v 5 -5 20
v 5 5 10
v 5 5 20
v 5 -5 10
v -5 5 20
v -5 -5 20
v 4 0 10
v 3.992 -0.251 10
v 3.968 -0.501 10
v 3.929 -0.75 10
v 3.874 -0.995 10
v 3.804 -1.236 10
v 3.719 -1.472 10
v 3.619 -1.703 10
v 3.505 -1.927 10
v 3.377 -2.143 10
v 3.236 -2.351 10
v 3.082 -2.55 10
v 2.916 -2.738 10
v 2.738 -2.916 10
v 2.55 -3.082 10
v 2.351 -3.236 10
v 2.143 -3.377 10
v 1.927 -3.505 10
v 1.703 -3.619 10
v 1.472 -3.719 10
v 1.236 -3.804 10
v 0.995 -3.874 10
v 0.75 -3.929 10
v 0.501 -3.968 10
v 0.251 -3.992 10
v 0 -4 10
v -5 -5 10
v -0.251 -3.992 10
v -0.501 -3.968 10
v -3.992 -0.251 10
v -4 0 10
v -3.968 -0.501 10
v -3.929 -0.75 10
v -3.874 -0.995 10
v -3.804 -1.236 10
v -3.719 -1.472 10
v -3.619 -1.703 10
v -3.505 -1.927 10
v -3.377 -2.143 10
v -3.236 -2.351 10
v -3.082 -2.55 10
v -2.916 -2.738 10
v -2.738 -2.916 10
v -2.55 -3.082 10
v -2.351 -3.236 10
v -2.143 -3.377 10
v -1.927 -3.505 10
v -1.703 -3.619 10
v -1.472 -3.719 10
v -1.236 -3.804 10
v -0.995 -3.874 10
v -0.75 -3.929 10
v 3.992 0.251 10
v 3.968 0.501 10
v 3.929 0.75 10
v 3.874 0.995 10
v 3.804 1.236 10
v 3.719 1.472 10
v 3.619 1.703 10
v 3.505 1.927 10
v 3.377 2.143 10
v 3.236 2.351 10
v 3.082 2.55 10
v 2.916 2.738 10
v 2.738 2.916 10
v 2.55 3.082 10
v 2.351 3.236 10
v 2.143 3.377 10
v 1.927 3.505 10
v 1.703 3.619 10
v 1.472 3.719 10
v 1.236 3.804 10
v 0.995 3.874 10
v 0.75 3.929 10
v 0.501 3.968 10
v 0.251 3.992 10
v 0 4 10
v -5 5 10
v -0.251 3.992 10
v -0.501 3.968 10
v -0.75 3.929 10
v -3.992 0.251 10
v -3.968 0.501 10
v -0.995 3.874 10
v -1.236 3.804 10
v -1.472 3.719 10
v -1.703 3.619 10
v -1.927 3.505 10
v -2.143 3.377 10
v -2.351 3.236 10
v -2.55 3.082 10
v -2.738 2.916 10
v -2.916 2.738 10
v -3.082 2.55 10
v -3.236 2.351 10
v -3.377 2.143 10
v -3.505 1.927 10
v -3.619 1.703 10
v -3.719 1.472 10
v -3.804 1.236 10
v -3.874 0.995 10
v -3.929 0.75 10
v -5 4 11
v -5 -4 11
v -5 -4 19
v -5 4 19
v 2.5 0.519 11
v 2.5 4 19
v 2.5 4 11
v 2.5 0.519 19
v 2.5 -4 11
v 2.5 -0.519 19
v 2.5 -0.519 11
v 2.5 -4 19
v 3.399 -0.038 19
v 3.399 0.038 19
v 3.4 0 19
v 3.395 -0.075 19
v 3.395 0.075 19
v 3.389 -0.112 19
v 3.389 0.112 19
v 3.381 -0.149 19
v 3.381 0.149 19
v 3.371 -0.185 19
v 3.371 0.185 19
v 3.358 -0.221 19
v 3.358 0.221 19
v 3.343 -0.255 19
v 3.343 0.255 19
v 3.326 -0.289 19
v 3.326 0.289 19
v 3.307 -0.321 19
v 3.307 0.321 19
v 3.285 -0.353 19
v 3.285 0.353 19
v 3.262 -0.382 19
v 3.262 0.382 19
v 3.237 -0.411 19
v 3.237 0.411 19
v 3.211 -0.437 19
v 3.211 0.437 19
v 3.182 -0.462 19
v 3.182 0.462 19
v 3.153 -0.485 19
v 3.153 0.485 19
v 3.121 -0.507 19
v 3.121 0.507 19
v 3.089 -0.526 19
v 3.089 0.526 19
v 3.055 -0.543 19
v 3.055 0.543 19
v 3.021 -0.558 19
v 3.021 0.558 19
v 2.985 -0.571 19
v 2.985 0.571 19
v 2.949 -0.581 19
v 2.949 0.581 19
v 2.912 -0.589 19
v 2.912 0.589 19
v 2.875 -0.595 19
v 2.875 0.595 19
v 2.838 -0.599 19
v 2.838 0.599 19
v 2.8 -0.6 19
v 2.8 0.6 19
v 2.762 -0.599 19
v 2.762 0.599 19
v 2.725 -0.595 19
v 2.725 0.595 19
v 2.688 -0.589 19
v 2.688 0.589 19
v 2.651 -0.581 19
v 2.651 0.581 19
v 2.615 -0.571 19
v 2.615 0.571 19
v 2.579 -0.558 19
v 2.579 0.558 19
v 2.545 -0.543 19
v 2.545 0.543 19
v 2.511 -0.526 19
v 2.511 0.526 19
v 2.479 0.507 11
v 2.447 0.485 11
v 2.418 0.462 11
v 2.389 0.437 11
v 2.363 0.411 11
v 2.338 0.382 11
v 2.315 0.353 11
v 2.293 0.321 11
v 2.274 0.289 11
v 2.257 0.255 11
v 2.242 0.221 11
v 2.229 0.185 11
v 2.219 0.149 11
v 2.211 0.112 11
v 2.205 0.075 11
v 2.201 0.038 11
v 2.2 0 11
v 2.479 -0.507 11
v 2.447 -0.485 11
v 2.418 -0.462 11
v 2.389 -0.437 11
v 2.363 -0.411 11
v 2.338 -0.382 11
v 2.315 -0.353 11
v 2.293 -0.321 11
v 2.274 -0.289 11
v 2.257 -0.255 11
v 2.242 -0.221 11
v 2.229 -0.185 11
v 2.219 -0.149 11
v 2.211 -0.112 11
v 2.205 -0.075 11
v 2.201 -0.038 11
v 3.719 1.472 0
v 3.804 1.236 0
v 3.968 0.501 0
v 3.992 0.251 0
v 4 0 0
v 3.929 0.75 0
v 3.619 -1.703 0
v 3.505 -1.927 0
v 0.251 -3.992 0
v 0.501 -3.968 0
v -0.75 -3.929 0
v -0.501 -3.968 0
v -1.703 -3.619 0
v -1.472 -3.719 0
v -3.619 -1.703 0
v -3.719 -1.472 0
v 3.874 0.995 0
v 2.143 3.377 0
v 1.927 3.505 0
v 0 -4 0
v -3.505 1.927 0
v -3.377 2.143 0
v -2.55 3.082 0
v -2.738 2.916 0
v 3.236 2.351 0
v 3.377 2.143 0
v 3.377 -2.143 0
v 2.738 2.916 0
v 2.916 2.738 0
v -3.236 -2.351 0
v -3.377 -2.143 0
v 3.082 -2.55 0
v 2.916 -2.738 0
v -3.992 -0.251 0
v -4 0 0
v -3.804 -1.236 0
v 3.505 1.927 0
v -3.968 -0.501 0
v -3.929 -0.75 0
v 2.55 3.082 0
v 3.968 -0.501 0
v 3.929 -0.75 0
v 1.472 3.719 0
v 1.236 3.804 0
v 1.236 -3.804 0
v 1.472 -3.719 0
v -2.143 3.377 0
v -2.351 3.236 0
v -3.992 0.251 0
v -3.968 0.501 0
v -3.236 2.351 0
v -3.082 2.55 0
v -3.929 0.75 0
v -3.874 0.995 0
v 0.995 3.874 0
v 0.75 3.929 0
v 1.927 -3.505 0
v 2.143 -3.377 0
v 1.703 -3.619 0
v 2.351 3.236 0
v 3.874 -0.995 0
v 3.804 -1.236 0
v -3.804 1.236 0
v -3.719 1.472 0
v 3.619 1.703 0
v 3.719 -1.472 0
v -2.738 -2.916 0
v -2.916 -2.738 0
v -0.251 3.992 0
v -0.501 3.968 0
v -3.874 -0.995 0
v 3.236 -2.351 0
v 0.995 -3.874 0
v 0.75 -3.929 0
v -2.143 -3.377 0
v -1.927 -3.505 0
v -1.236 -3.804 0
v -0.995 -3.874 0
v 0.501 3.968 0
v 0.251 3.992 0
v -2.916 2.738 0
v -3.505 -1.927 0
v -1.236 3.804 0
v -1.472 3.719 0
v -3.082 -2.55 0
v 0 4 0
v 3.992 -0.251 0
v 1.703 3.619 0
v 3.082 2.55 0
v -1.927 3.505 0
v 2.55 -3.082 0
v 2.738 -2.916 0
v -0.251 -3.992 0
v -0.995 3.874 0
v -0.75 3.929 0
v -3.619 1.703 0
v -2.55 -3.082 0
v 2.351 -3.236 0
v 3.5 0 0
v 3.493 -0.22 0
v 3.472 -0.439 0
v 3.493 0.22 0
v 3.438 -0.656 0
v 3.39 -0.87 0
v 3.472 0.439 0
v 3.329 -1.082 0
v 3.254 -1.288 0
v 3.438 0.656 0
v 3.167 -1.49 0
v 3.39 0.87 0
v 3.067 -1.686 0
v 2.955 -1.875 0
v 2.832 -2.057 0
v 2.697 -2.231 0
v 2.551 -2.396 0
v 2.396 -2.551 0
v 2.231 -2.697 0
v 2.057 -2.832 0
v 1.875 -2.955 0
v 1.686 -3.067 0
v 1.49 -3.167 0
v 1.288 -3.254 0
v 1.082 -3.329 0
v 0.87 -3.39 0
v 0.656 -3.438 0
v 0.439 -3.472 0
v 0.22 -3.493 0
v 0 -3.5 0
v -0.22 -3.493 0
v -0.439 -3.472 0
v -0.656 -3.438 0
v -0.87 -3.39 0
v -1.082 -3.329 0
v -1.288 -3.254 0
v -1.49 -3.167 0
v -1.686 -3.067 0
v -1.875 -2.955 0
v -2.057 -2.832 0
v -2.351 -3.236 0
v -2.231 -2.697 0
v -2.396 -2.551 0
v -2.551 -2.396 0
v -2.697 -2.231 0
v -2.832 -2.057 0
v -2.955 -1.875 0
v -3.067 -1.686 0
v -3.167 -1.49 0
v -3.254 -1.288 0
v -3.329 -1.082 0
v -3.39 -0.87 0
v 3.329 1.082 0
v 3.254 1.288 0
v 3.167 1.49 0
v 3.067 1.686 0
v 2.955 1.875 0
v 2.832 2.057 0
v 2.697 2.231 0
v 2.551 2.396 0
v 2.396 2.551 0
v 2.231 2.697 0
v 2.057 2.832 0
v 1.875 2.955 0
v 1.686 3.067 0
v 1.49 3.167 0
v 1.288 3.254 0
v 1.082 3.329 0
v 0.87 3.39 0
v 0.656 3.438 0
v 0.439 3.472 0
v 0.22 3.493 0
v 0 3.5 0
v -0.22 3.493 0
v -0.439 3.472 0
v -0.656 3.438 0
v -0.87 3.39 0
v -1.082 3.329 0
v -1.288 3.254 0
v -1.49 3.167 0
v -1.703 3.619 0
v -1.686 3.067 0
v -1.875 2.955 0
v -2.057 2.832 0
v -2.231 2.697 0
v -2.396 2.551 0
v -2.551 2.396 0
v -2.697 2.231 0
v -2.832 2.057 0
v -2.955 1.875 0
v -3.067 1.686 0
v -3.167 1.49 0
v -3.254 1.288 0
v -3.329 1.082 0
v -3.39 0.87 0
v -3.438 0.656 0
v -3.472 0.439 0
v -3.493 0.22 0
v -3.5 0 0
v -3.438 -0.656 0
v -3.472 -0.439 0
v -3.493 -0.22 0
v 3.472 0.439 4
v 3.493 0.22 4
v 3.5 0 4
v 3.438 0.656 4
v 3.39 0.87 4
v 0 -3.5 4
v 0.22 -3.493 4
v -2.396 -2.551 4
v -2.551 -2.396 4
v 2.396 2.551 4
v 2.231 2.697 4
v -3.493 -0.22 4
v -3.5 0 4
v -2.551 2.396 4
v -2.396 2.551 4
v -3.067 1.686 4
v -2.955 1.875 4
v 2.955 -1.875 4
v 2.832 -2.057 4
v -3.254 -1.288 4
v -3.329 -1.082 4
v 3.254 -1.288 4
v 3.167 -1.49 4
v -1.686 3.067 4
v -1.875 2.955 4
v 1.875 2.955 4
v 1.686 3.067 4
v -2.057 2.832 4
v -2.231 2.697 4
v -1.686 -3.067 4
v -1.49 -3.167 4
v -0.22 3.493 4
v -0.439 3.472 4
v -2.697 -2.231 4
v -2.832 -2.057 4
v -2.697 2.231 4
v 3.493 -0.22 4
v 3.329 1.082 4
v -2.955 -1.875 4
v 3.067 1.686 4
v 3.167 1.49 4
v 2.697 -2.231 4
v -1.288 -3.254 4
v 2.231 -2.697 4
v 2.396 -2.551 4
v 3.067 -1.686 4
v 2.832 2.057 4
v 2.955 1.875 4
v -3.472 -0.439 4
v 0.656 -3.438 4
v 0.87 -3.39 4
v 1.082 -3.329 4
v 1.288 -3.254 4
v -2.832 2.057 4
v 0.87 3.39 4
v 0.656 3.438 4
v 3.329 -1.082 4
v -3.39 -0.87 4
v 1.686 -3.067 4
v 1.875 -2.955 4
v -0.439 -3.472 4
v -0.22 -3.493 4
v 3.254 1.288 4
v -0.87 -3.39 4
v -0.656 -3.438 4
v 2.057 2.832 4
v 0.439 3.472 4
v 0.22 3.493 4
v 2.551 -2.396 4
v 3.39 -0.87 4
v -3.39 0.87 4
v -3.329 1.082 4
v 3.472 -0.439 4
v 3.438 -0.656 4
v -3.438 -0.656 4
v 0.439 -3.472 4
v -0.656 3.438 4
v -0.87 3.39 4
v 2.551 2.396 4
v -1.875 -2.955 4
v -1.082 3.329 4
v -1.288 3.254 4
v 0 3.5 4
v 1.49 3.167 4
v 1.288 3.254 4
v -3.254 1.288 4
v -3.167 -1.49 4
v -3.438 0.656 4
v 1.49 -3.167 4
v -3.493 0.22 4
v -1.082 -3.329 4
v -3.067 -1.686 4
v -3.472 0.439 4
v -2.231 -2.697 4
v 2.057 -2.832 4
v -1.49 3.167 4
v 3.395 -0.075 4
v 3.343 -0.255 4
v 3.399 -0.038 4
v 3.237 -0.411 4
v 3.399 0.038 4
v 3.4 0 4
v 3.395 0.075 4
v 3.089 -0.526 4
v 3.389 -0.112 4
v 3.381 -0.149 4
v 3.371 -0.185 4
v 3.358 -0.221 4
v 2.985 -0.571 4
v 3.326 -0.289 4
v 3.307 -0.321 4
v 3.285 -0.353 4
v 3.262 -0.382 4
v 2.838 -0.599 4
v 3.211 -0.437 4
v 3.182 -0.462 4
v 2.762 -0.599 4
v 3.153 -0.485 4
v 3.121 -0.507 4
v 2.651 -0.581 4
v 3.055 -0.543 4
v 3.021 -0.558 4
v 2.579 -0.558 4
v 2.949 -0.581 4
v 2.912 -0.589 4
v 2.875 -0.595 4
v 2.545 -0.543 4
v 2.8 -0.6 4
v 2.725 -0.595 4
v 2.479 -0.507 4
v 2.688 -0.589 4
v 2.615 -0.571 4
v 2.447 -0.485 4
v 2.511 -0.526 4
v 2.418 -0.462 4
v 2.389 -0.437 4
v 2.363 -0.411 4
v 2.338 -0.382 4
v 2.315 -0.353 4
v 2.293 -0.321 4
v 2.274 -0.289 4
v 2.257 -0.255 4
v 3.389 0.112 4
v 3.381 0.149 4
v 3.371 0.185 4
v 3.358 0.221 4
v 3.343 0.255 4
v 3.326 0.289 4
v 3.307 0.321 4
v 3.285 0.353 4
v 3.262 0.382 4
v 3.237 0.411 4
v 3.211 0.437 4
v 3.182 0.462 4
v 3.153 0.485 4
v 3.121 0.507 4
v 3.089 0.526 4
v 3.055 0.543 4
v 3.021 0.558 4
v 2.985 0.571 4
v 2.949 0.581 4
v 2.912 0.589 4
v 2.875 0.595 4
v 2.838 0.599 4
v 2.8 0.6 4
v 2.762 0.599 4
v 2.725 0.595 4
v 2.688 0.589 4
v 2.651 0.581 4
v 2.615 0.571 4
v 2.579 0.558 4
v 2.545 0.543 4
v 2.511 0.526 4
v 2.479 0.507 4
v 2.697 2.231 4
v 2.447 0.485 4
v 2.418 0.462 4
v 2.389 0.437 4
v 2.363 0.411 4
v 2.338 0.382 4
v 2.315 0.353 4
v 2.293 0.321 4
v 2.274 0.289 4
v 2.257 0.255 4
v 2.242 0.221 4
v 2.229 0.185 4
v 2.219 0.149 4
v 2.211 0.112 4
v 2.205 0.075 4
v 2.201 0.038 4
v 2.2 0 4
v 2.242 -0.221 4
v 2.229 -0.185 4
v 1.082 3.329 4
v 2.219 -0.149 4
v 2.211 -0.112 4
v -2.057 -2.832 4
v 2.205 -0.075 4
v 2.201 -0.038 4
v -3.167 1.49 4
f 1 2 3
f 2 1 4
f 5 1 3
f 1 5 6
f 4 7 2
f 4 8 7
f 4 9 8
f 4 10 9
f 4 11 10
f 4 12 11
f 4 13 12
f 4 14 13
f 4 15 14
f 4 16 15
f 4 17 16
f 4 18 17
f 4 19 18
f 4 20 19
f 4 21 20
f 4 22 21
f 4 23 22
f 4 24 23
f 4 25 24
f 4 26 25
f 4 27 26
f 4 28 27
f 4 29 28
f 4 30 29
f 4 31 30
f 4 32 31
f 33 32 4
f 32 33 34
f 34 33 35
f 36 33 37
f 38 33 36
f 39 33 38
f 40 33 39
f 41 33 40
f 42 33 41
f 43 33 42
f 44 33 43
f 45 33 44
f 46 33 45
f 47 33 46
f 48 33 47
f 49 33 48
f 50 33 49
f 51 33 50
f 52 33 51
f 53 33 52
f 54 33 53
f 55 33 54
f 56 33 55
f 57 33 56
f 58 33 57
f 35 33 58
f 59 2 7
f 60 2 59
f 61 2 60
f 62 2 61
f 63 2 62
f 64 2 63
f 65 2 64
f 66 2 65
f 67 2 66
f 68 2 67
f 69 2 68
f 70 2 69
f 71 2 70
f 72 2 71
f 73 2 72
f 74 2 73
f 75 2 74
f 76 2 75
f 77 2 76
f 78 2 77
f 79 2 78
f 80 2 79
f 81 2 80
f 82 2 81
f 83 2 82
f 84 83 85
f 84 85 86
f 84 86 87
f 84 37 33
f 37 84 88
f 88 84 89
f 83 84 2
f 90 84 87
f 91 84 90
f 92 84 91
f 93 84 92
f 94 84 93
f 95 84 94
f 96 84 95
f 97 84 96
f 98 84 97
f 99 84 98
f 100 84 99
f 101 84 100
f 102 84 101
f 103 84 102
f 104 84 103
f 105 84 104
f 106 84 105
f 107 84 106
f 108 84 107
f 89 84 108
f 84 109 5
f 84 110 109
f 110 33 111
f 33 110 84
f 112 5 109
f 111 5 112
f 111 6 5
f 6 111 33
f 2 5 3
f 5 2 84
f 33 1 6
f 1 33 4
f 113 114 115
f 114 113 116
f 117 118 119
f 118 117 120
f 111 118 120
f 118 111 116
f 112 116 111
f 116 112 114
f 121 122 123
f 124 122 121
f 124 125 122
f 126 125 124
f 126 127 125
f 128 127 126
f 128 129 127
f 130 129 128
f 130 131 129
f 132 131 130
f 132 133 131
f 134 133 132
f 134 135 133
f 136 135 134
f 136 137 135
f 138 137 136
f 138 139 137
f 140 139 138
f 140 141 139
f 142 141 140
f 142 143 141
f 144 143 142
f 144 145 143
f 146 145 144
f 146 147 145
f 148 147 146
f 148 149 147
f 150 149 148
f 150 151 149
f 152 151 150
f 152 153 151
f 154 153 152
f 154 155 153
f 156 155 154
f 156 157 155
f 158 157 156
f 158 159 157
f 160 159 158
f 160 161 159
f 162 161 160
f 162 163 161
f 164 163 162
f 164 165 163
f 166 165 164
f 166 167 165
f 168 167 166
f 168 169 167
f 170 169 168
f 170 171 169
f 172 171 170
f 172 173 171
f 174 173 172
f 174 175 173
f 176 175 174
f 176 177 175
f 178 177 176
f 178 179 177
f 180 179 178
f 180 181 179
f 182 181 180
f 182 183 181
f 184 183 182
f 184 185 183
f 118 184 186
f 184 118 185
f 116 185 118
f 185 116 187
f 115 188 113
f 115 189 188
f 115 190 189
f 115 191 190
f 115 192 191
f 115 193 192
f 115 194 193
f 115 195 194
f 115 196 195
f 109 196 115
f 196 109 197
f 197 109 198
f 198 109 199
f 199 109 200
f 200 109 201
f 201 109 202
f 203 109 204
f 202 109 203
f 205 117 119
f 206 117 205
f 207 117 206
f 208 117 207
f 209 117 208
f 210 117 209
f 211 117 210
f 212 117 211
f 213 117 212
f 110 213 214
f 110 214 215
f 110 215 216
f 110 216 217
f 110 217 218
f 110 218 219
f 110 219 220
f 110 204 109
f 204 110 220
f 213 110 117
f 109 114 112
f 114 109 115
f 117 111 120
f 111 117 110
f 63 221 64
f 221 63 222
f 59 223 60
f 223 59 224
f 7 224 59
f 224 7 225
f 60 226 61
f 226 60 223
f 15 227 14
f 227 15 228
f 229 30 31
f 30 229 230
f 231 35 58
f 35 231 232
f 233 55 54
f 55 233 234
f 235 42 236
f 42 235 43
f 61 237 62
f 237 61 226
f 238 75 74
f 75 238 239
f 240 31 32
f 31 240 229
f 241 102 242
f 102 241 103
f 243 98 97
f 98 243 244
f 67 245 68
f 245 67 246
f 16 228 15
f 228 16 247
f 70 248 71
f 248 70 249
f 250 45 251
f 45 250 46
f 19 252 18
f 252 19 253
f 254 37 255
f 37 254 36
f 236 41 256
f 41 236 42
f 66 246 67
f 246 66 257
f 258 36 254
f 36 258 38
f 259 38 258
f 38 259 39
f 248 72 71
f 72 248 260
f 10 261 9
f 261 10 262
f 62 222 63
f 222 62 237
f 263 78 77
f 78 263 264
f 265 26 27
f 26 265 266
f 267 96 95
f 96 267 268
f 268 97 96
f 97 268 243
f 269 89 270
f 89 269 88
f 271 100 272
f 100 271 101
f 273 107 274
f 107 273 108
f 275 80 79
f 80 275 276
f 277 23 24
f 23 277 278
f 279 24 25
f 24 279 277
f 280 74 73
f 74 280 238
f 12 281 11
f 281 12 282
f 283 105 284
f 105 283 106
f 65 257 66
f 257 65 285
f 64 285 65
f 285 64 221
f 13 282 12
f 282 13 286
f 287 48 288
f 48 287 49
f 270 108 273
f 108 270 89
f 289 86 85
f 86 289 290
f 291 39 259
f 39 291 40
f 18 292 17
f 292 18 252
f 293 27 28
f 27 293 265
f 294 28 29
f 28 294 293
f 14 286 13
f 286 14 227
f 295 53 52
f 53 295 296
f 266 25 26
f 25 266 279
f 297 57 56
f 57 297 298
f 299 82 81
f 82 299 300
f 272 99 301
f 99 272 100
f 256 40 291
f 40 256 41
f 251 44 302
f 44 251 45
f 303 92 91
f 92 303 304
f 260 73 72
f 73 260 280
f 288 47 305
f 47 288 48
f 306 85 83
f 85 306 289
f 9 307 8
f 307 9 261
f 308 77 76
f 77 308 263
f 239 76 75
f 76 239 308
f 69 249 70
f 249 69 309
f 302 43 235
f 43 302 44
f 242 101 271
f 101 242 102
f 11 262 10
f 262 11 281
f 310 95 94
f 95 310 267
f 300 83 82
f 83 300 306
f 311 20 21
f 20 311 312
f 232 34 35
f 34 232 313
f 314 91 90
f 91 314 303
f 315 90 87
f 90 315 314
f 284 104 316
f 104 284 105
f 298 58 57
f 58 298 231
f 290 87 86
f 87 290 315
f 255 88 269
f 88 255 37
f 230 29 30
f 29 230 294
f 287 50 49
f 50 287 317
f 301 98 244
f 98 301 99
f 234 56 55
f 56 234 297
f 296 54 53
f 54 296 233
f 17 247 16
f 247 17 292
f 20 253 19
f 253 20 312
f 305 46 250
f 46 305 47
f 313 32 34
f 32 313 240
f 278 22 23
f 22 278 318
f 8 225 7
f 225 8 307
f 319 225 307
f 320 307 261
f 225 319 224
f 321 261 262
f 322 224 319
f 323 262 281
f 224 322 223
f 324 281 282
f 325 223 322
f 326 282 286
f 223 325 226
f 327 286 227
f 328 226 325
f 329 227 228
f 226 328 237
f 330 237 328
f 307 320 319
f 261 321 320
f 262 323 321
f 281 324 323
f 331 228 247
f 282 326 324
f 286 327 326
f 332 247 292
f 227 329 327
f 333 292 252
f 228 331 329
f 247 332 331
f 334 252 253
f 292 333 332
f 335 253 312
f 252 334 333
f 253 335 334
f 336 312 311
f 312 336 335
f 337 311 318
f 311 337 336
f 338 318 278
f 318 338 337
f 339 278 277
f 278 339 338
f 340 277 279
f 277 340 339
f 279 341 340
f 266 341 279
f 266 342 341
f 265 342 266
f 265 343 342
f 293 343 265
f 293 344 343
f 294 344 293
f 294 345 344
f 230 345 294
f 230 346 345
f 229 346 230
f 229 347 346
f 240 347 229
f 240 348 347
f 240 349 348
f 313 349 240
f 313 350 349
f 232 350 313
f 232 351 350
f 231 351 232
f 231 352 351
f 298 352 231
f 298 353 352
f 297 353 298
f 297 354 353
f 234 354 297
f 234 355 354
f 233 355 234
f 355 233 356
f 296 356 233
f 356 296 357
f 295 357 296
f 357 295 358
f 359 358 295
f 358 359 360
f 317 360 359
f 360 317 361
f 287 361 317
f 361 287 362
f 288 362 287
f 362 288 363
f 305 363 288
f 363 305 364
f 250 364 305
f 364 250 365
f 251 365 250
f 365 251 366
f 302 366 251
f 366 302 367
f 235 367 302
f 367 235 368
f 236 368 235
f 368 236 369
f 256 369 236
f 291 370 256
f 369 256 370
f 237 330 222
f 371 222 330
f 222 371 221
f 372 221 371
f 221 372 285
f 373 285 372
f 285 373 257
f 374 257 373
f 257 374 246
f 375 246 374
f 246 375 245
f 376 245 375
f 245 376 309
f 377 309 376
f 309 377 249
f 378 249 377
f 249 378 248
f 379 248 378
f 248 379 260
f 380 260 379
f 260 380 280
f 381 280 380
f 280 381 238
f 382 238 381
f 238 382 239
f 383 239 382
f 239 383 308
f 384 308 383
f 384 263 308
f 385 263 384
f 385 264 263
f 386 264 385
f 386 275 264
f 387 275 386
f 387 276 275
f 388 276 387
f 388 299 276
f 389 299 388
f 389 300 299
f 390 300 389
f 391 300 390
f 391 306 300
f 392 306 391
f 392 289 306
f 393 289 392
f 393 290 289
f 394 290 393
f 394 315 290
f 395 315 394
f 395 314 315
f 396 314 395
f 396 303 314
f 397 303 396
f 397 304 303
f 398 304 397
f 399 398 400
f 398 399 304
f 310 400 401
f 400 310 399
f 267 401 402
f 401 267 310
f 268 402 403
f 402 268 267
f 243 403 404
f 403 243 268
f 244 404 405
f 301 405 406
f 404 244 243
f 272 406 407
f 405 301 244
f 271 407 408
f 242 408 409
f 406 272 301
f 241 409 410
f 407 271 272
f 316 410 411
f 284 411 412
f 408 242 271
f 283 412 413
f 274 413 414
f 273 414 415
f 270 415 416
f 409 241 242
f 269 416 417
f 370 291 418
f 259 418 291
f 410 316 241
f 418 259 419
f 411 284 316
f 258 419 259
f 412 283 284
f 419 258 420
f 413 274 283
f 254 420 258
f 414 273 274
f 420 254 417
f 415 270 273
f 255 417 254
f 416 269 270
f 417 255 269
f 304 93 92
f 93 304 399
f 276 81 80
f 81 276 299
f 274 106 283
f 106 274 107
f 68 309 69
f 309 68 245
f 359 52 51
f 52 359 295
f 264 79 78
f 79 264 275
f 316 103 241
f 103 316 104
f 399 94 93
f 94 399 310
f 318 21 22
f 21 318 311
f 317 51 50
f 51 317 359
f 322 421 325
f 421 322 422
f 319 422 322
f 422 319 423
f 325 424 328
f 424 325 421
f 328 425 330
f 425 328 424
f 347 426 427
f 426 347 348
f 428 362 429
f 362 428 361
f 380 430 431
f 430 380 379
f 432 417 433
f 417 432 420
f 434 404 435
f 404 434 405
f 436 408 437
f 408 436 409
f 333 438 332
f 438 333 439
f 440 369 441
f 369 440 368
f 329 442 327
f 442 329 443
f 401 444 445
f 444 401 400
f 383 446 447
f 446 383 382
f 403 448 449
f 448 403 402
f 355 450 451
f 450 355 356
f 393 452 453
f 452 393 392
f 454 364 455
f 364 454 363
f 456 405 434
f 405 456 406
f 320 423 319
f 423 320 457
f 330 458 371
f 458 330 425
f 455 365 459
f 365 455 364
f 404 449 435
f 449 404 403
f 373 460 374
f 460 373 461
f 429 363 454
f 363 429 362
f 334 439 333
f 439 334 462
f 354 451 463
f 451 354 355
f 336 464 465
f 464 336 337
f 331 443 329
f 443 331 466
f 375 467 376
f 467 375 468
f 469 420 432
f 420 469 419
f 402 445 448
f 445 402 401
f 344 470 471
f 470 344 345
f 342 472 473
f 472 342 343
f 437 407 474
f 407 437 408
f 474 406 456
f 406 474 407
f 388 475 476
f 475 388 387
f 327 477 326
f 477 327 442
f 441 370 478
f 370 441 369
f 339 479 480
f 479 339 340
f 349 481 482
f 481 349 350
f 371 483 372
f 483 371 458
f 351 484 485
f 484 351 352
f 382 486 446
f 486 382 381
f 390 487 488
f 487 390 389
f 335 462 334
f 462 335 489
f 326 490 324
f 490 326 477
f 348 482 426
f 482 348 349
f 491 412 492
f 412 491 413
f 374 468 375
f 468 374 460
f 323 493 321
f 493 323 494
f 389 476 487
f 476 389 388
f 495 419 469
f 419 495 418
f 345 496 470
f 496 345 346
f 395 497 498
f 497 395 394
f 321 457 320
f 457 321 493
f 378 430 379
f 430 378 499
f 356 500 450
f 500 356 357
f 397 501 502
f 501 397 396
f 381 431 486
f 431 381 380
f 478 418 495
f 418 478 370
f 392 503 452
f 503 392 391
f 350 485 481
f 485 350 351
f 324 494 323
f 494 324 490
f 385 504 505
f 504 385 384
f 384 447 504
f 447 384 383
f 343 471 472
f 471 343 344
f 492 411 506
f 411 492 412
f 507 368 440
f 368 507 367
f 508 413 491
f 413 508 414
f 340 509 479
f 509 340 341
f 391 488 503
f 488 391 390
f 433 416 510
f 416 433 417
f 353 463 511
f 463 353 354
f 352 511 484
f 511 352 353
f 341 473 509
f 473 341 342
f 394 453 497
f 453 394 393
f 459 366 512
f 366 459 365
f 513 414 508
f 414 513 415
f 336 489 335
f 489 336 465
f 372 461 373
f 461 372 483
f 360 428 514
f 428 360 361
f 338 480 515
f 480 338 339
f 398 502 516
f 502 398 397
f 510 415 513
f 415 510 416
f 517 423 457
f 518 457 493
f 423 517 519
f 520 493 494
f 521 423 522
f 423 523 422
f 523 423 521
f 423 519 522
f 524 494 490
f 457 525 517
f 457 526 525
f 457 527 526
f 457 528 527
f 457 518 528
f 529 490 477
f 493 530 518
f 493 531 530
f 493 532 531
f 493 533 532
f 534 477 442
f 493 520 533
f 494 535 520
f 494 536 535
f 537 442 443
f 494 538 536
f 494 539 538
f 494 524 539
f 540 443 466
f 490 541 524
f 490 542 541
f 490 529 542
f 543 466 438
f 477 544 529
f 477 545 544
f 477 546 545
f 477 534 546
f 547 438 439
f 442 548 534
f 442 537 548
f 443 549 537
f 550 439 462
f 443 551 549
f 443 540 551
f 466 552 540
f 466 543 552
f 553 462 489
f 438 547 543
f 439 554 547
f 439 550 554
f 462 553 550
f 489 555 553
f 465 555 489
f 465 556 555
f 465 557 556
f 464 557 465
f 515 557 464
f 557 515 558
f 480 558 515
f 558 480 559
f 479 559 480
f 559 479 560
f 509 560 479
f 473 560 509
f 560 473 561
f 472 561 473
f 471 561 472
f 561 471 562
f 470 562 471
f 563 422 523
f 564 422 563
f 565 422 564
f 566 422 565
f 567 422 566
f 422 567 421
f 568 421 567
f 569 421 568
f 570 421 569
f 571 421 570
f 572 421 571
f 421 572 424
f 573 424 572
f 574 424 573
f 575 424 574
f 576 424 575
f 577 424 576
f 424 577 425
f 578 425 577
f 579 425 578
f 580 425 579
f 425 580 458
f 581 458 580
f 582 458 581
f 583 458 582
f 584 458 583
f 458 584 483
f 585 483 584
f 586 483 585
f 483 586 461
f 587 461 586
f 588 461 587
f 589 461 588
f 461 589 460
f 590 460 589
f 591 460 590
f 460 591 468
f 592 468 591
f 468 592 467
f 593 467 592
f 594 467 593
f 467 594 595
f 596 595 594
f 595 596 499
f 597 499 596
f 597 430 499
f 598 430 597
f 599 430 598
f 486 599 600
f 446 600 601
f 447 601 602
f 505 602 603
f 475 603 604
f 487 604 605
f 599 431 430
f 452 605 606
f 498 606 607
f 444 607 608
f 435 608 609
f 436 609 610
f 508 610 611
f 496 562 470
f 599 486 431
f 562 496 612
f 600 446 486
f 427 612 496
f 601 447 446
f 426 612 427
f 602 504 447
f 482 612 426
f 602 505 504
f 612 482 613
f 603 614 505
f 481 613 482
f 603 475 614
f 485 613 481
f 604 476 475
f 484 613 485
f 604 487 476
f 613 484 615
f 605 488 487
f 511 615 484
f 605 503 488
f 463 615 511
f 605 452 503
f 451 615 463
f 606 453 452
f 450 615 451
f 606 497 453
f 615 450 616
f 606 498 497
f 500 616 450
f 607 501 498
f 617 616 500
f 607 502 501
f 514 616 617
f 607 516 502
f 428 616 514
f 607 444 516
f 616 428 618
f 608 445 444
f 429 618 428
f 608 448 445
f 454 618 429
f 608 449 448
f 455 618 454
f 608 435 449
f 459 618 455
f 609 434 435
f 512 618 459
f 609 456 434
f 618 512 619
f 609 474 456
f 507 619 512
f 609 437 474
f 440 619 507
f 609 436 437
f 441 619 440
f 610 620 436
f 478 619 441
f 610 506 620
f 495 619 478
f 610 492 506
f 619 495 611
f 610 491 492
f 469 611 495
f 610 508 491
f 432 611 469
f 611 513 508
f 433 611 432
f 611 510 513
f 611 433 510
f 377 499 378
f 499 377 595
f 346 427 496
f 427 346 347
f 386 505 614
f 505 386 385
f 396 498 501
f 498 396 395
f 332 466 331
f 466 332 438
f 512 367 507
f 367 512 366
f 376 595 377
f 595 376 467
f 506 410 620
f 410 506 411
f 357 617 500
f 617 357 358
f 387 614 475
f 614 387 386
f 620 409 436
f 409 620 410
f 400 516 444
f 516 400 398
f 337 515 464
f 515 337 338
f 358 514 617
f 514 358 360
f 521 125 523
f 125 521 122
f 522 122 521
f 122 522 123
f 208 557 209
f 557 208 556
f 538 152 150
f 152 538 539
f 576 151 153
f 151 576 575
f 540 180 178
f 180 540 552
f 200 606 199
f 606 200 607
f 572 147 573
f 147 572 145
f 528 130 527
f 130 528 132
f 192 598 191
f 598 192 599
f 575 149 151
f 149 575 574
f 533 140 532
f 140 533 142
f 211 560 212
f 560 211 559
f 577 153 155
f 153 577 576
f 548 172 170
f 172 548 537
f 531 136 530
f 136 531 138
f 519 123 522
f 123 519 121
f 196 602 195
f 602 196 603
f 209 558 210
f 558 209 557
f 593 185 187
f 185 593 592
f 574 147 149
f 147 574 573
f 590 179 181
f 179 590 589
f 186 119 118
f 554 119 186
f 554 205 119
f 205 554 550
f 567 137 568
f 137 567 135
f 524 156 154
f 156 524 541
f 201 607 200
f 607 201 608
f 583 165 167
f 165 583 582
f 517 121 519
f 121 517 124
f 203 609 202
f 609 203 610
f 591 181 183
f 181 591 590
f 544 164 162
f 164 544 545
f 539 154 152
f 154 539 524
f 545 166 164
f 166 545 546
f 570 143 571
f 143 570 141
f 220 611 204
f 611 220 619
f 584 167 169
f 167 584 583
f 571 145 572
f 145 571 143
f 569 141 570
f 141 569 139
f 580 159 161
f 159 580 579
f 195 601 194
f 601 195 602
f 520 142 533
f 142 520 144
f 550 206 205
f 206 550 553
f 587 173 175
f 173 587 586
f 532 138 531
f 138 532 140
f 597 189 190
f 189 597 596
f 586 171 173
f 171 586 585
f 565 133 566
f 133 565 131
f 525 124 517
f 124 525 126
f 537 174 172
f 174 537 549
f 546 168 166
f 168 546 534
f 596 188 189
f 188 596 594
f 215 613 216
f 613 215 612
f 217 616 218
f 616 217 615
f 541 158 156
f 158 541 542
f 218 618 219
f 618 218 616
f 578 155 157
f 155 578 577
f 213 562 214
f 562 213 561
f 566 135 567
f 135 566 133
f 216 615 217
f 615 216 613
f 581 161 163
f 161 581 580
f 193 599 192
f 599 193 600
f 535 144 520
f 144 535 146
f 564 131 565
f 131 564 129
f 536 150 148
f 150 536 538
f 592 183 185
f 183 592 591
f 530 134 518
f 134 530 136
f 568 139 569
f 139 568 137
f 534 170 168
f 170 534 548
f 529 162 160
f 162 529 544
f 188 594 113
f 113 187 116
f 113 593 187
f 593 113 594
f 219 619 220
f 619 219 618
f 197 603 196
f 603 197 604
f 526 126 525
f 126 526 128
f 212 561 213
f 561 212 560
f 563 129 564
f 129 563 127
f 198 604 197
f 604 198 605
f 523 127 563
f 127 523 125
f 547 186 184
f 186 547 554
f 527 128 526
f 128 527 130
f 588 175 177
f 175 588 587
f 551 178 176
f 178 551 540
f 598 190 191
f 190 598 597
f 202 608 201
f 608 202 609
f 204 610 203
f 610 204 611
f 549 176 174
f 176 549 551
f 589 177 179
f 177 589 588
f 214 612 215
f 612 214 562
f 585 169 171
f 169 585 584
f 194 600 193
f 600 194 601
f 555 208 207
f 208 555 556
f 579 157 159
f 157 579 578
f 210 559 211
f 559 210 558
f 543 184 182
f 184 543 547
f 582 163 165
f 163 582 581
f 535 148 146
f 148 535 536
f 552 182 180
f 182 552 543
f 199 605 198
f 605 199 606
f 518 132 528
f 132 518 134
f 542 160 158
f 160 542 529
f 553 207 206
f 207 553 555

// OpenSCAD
difference(){
union(){
translate([-5,-5,10]){
difference(){
    cube([10,10,10,]);
    translate([-0.5,1,1])cube([8,8,8,]);}
    }  
difference(){
cylinder(d=8,h=10,$fn
=100);

translate([0,0,-1])cylinder(d=7,h=5,$fn
=100);

}

}

translate([2.8,0,1])cylinder(d=1.2,h=18,$fn
=100);}
